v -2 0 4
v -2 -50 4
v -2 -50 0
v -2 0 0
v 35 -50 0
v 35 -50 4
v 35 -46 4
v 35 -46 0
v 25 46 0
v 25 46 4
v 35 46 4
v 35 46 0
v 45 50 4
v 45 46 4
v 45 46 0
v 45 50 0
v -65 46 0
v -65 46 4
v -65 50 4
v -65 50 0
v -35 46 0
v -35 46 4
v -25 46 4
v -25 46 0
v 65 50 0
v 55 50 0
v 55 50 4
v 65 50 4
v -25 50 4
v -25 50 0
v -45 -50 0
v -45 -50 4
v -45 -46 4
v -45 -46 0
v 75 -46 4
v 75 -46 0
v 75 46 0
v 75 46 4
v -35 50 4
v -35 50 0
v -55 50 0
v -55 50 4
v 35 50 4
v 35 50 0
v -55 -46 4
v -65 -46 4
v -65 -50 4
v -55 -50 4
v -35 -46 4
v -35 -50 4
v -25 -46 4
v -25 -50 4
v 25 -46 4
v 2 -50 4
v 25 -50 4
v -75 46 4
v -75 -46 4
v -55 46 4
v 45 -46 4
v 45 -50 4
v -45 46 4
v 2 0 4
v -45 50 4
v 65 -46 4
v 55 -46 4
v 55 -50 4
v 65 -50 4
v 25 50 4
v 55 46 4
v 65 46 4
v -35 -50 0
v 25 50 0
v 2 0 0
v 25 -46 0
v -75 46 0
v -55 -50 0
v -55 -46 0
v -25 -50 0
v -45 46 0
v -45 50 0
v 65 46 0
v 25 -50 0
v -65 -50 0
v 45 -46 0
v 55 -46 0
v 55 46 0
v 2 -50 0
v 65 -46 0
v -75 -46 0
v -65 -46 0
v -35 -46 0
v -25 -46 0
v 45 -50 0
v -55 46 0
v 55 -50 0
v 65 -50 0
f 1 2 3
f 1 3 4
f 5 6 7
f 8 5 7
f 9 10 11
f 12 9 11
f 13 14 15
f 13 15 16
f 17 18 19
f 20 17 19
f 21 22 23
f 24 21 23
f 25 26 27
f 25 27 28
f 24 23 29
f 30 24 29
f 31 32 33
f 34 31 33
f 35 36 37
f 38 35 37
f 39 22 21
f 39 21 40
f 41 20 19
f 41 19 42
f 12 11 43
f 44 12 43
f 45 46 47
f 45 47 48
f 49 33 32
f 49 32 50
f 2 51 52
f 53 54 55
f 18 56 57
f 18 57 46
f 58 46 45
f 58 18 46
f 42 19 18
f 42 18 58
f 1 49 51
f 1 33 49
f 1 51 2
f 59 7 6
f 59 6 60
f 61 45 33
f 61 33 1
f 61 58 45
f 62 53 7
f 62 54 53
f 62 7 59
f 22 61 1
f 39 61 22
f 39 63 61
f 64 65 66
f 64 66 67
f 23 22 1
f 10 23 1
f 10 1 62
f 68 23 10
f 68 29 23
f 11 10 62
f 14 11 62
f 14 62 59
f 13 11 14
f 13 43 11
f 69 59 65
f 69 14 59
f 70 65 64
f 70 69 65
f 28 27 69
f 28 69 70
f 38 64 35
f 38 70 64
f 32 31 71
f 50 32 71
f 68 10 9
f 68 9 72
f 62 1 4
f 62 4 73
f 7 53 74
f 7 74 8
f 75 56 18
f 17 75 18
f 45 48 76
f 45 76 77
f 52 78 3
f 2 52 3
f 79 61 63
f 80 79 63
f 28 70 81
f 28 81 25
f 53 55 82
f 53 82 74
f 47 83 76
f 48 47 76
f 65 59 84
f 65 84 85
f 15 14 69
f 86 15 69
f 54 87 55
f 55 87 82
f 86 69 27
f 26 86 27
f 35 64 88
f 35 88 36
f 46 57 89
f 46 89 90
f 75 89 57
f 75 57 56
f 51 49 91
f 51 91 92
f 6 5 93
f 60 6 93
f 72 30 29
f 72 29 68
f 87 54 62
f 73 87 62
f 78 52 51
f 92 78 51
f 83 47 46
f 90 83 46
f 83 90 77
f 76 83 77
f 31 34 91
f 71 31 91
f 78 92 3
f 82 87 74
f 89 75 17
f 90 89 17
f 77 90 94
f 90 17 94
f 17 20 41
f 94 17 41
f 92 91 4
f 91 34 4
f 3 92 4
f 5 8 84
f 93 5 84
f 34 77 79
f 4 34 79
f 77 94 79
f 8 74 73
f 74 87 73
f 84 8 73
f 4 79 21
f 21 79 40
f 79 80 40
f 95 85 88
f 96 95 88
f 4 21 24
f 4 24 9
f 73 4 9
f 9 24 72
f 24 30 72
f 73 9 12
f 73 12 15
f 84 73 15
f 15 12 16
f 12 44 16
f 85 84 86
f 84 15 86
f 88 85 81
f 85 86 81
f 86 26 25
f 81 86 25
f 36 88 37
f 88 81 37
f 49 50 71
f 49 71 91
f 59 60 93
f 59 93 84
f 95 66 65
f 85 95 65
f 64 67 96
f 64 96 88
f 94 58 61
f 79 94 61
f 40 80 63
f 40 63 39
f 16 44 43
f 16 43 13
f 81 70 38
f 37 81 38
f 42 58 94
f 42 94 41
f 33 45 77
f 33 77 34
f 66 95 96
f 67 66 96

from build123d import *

# Parameters (mm, degrees)
SKETCH1_W           = 150
SKETCH1_H           = 100
BOSS_EXTRUDE1_DEPTH = 4
CUT_EXTRUDE2_START  = 4
SKETCH3_W           = 10
SKETCH3_H           = 4
SKETCH3_W_2         = 4
SKETCH3_H_2         = 50
CUT_EXTRUDE2_DEPTH  = 5


with BuildPart() as part:
    # Sketch1 → Boss-Extrude1 (new body)
    with BuildSketch(Plane.XY):
        Rectangle(SKETCH1_W, SKETCH1_H)
    extrude(amount=BOSS_EXTRUDE1_DEPTH)

    # Sketch3 → Cut-Extrude2 (cut, through all)
    with BuildSketch(Plane.XY.offset(CUT_EXTRUDE2_START)):
        with Locations((-50, 48)):
            Rectangle(SKETCH3_W, SKETCH3_H)
        with Locations((-30, 48)):
            Rectangle(SKETCH3_W, SKETCH3_H)
        with Locations((-70, 48)):
            Rectangle(SKETCH3_W, SKETCH3_H)
        with Locations((70, 48)):
            Rectangle(SKETCH3_W, SKETCH3_H)
        with Locations((50, 48)):
            Rectangle(SKETCH3_W, SKETCH3_H)
        with Locations((30, 48)):
            Rectangle(SKETCH3_W, SKETCH3_H)
        with Locations((50, -48)):
            Rectangle(SKETCH3_W, SKETCH3_H)
        with Locations((30, -48)):
            Rectangle(SKETCH3_W, SKETCH3_H)
        with Locations((70, -48)):
            Rectangle(SKETCH3_W, SKETCH3_H)
        with Locations((-70, -48)):
            Rectangle(SKETCH3_W, SKETCH3_H)
        with Locations((-50, -48)):
            Rectangle(SKETCH3_W, SKETCH3_H)
        with Locations((-30, -48)):
            Rectangle(SKETCH3_W, SKETCH3_H)
        with Locations((0, -25)):
            Rectangle(SKETCH3_W_2, SKETCH3_H_2)
    extrude(amount=-CUT_EXTRUDE2_DEPTH, mode=Mode.SUBTRACT)


solid = part.part
